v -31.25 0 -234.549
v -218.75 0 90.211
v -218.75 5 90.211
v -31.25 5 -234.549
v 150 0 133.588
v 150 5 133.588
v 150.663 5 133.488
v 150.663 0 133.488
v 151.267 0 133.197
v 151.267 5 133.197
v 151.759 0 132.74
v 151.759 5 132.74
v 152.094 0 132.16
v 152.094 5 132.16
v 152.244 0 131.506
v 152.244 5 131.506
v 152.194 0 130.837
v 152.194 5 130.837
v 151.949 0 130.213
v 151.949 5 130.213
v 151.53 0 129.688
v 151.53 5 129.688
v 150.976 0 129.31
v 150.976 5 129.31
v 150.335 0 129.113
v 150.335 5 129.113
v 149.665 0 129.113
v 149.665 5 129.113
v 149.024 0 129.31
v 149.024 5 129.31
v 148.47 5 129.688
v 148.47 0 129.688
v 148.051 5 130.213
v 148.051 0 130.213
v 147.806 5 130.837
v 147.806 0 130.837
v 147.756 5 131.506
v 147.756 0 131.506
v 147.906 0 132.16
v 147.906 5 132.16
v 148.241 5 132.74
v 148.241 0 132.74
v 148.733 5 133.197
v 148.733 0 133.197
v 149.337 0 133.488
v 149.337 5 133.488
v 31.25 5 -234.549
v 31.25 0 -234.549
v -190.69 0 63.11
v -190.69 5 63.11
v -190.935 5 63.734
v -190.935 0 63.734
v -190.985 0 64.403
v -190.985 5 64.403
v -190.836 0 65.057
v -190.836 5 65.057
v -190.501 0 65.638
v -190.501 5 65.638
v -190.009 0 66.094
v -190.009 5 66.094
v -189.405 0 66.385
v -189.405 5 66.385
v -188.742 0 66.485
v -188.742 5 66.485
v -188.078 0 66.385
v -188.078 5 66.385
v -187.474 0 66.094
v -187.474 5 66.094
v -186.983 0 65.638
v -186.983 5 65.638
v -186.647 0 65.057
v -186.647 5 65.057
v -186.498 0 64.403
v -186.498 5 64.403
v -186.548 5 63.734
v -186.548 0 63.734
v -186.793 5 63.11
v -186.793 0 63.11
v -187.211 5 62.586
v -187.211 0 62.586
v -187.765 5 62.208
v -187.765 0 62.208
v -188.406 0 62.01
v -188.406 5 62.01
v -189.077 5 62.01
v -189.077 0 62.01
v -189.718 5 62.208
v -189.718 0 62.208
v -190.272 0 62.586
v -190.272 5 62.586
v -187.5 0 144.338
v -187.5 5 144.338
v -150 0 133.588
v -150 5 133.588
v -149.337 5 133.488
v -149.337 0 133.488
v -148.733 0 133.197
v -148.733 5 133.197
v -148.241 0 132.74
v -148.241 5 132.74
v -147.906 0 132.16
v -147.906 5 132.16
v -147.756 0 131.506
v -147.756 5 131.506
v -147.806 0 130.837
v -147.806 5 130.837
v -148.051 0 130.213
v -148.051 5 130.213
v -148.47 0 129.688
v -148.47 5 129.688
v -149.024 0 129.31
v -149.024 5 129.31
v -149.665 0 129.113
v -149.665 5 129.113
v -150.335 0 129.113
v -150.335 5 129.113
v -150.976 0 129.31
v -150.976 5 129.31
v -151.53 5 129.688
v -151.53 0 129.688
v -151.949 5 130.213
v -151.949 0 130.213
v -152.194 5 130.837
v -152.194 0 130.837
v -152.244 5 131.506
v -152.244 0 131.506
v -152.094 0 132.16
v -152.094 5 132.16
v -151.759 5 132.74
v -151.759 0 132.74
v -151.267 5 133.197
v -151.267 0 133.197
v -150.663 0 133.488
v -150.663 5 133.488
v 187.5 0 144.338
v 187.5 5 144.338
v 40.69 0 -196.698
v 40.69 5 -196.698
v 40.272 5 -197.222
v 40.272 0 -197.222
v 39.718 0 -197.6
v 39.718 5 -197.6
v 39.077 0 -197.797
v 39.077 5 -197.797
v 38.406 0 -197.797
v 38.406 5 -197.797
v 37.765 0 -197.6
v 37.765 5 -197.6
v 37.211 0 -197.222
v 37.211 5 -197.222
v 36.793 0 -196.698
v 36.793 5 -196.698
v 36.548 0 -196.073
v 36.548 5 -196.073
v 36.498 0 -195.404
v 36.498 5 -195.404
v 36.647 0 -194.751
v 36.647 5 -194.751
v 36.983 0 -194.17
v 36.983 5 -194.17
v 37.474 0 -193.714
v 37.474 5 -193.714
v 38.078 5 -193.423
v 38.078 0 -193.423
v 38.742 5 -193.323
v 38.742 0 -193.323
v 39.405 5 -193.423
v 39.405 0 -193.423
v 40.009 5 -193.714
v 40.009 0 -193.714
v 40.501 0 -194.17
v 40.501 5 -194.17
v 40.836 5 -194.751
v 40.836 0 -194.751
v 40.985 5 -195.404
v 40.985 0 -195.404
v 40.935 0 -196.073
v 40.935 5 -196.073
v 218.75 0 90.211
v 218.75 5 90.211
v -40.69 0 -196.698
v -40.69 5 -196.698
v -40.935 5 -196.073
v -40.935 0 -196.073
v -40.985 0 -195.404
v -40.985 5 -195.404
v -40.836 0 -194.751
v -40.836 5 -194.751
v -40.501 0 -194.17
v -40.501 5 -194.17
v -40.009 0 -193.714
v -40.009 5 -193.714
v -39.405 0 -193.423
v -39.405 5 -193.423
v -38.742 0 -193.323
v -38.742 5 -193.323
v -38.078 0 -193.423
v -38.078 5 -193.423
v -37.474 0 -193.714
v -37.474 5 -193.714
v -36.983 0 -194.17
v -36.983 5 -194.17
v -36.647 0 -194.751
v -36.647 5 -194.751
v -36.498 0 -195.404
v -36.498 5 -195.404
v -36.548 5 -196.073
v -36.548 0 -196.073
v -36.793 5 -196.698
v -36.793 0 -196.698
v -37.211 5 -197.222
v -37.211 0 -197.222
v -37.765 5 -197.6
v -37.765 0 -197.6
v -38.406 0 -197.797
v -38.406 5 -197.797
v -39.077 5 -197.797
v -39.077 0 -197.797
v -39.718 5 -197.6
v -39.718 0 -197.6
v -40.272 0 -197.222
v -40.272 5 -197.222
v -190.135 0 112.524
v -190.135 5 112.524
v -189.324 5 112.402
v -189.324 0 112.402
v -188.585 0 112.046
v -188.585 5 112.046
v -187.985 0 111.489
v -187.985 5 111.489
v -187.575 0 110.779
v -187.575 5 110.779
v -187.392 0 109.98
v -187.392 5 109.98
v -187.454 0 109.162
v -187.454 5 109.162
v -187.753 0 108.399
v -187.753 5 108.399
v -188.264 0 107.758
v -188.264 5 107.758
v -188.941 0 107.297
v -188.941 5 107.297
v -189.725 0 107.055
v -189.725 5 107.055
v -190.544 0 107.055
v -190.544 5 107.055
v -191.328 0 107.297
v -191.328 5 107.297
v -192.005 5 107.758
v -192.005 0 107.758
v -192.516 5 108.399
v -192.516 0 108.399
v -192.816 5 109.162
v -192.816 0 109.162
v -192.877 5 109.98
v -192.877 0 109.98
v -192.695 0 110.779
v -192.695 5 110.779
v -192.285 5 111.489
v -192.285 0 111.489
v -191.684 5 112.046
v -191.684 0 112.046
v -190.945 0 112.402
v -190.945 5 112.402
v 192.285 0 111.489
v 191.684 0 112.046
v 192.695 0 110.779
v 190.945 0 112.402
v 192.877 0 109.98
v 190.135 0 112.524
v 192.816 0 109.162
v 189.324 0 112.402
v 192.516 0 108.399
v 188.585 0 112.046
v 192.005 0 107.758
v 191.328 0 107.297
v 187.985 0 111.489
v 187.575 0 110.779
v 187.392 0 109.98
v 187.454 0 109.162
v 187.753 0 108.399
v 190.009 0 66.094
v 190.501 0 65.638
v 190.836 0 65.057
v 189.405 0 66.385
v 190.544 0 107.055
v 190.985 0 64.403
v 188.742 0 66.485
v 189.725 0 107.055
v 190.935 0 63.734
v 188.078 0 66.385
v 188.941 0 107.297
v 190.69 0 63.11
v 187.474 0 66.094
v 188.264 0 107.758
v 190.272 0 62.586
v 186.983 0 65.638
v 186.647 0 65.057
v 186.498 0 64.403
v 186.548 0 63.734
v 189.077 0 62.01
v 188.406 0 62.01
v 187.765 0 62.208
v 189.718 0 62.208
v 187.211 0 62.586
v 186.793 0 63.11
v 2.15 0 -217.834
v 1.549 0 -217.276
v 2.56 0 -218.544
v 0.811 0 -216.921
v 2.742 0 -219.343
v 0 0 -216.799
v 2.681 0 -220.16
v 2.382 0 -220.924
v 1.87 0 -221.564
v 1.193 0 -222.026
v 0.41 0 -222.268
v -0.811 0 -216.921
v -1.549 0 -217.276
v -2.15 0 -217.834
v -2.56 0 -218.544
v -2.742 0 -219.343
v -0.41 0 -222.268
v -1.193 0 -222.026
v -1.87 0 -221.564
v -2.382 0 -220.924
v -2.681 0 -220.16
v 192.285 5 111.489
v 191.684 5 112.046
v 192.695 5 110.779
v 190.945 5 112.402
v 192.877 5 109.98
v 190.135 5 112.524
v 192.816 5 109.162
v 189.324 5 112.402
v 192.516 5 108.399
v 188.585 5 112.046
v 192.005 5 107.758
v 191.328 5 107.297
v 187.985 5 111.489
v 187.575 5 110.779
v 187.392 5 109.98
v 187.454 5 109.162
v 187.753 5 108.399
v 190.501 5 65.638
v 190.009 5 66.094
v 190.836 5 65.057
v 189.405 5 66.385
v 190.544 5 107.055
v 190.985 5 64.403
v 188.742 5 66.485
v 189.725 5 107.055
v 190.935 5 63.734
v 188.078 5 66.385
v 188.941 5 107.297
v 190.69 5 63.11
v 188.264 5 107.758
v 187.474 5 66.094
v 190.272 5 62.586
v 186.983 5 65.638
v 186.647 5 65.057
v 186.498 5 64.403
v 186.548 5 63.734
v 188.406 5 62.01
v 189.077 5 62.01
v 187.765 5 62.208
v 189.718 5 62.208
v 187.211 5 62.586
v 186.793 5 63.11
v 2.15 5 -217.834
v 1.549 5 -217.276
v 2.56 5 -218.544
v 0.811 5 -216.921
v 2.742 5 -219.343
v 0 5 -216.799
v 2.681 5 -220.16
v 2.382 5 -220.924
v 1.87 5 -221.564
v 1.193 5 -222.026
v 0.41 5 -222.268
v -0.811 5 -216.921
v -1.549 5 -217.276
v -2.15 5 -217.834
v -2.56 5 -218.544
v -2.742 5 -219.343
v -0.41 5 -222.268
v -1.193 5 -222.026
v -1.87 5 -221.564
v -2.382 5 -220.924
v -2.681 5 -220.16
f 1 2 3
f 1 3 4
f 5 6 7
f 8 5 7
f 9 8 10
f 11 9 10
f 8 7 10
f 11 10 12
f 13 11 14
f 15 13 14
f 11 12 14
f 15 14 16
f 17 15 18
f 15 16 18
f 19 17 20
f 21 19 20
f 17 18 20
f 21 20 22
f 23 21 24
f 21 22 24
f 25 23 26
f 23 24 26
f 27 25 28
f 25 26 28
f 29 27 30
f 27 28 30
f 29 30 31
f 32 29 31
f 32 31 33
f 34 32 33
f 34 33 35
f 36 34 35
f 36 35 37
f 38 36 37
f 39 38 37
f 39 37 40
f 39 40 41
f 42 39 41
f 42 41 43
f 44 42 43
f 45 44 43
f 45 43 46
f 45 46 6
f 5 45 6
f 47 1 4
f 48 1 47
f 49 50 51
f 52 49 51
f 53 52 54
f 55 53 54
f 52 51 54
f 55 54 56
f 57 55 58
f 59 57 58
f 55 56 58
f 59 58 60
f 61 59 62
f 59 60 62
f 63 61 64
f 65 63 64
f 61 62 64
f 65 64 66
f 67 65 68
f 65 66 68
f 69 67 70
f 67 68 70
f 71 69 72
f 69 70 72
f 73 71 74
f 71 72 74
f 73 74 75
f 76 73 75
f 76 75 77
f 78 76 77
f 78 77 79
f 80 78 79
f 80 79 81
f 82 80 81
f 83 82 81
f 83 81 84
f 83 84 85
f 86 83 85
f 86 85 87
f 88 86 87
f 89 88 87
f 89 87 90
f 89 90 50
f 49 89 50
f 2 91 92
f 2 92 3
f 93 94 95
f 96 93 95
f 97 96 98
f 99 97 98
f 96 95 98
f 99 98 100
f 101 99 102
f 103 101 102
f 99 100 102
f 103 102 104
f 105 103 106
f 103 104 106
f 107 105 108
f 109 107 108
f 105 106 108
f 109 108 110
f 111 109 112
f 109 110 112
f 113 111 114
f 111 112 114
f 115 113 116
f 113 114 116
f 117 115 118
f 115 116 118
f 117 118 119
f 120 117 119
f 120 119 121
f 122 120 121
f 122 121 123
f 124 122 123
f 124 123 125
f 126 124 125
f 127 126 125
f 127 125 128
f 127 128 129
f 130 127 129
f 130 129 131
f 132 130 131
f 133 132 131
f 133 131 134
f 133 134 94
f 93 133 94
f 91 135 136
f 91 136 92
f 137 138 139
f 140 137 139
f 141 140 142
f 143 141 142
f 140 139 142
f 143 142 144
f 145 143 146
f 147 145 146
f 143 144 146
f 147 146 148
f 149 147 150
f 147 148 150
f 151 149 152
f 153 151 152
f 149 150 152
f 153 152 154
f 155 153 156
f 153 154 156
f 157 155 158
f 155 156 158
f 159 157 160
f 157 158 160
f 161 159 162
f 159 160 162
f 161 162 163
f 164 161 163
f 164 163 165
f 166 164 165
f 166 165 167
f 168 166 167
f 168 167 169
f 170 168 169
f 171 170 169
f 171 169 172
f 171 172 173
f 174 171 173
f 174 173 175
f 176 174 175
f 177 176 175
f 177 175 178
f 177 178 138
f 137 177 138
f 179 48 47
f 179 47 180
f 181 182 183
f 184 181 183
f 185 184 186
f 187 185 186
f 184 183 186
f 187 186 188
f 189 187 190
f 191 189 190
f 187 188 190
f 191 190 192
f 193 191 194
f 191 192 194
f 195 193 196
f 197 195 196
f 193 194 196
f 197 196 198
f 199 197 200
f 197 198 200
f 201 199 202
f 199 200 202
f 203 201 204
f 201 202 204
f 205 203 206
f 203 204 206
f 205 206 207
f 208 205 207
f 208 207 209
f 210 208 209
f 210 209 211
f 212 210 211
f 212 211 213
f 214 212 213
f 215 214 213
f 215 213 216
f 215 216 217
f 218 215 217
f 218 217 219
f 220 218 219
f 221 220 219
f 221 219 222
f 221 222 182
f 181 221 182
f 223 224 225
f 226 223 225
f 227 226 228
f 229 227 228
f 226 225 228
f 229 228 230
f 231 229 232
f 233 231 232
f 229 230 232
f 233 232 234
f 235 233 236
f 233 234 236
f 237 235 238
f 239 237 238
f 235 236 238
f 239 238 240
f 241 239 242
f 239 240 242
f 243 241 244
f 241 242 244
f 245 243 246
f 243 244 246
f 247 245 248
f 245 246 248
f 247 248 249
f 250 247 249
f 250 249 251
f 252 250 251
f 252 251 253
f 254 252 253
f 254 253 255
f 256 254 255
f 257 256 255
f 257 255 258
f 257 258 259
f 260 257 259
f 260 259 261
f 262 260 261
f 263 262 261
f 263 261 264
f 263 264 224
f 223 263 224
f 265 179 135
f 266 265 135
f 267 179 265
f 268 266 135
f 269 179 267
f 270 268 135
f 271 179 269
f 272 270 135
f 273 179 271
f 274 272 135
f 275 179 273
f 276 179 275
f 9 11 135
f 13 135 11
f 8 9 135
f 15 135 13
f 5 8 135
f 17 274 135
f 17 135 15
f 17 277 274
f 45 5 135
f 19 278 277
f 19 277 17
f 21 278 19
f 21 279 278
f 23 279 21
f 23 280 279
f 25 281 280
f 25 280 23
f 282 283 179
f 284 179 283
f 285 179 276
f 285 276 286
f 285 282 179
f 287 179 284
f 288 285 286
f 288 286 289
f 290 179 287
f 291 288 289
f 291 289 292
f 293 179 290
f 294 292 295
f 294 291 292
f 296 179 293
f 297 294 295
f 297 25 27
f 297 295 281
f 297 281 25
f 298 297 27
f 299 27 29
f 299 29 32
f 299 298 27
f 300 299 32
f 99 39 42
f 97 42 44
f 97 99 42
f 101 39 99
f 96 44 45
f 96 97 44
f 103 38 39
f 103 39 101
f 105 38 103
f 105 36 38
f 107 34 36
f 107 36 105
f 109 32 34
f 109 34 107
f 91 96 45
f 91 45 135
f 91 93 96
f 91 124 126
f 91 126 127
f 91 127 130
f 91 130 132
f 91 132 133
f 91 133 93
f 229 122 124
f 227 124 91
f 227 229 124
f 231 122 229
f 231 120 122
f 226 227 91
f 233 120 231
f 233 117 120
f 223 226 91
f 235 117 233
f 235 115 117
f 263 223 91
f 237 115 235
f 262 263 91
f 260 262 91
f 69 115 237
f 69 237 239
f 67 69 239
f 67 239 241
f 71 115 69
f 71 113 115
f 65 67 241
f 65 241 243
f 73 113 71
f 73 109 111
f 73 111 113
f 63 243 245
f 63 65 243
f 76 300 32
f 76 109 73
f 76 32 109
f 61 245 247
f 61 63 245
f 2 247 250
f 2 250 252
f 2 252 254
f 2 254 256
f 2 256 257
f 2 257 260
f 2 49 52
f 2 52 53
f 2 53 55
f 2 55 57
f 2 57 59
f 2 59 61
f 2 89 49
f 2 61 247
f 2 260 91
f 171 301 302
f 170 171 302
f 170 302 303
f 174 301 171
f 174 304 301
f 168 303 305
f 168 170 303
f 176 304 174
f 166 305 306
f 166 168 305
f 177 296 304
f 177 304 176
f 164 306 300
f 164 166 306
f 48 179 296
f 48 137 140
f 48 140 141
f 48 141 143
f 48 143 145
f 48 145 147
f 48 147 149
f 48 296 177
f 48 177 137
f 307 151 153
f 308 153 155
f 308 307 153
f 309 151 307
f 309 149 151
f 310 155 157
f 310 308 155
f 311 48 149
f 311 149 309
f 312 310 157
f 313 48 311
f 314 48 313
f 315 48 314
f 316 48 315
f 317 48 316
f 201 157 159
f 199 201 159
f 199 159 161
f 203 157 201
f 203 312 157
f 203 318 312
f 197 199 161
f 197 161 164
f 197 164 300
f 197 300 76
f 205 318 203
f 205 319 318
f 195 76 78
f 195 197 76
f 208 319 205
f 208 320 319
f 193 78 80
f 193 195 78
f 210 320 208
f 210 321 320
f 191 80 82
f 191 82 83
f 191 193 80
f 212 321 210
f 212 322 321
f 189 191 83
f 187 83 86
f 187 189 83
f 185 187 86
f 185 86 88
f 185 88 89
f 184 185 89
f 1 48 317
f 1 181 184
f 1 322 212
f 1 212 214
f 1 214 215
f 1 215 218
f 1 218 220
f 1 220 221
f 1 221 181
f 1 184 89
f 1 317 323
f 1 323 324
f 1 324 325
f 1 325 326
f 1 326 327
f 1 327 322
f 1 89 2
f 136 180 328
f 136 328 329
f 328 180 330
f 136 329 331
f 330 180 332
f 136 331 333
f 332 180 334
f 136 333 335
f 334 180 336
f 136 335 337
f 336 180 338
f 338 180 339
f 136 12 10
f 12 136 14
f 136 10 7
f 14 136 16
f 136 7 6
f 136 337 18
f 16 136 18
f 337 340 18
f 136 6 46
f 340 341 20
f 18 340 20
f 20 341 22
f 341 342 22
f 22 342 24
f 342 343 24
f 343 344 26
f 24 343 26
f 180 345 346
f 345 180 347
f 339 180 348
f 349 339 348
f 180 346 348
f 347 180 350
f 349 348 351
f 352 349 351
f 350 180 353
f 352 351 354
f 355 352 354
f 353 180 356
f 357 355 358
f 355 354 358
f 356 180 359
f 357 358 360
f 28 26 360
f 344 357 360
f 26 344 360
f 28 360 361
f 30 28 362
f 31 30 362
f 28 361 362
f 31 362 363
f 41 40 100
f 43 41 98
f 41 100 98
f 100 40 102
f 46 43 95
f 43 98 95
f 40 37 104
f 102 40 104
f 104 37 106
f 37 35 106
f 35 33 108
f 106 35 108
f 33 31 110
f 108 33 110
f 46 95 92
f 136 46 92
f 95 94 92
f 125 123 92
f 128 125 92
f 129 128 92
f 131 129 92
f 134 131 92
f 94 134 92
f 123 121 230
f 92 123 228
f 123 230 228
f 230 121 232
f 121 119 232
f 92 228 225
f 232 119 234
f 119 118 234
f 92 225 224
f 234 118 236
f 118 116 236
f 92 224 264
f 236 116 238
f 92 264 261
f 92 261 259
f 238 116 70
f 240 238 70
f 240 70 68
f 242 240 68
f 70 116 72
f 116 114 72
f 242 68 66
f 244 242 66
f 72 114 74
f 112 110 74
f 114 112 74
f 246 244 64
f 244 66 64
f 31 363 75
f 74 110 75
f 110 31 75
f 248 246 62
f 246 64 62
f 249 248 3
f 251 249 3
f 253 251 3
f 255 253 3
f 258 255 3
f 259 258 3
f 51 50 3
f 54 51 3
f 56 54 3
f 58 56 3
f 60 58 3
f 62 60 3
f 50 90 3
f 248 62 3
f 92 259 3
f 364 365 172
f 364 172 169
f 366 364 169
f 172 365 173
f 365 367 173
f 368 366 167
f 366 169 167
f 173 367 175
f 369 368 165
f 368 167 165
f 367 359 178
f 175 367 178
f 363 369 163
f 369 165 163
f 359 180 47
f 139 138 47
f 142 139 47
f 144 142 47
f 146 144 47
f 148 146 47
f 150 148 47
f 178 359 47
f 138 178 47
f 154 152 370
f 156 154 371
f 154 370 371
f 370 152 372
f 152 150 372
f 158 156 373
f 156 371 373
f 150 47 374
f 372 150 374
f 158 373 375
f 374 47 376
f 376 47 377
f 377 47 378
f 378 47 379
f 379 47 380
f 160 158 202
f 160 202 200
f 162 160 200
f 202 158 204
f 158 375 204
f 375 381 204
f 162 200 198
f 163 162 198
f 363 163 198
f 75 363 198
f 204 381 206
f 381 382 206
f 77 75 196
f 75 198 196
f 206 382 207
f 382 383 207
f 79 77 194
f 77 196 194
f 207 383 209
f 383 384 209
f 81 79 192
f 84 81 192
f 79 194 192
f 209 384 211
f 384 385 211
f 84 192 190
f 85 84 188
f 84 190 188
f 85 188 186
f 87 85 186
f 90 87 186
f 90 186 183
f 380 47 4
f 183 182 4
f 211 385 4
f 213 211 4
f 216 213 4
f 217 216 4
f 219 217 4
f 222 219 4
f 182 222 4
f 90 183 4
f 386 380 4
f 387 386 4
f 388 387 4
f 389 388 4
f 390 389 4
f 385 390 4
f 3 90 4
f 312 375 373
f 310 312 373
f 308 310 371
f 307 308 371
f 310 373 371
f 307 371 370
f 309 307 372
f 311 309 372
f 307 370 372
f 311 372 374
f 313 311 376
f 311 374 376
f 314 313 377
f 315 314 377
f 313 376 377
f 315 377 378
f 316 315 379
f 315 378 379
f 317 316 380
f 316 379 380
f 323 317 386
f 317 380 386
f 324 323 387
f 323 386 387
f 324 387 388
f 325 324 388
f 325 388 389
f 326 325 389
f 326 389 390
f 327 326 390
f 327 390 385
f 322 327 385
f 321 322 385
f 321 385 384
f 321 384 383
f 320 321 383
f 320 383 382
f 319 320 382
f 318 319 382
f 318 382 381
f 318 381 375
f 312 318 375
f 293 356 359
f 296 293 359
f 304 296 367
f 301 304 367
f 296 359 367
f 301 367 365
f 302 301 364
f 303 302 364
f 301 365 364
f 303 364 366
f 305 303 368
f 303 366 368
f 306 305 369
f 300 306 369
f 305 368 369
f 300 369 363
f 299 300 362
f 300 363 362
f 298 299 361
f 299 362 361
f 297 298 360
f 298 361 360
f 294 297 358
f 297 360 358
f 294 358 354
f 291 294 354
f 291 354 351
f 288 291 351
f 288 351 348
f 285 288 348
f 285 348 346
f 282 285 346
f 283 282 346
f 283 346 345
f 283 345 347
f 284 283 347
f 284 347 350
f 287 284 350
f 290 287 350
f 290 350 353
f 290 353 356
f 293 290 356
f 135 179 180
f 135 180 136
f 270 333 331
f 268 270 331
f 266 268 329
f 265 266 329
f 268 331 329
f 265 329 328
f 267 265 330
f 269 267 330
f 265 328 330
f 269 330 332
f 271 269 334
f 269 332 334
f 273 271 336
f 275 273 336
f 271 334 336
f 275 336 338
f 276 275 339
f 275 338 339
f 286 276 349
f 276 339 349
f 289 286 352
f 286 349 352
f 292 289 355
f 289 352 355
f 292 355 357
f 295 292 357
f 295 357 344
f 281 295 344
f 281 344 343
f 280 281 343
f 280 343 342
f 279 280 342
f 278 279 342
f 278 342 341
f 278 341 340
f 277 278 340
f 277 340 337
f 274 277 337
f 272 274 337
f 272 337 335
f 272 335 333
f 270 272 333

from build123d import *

# Parameters (mm, degrees)
BOSS_EXTRU_1_DEPTH           = 5
ENL_V_MAT_EXTRU_1_REACH      = 322.764
ESQUISSE2_R                  = 2.75
ENL_V_MAT_EXTRU_4_REACH      = 322.764
ESQUISSE6_R                  = 2.25
R_P_TITION_CIRCULAIRE2_COUNT = 3


with BuildPart() as part:
    # Esquisse1 → Boss.-Extru.1 (new body)
    with BuildSketch(Plane(origin=(0, 0, 0), x_dir=(1, 0, 0), z_dir=(0, 1, 0))):
        Polygon((-31.25, 234.548546858), (31.25, 234.548546858), (218.75, -90.210979561), (187.5, -144.337567297), (-187.5, -144.337567297), (-218.75, -90.210979561), align=None)
    extrude(amount=BOSS_EXTRU_1_DEPTH)

    # Esquisse2 → Enlèv. mat.-Extru.1 (cut, up to next)
    with BuildSketch(Plane(origin=(0, 5, 0), x_dir=(1, 0, 0), z_dir=(0, 1, 0)), mode=Mode.PRIVATE) as enl_v_mat_extru_1_sk1:
        with Locations((0, 219.548546858)):
            Circle(ESQUISSE2_R)
    enl_v_mat_extru_1_tool1 = extrude(enl_v_mat_extru_1_sk1.sketch, amount=-ENL_V_MAT_EXTRU_1_REACH, mode=Mode.PRIVATE) & part.part
    # Esquisse2 → Enlèv. mat.-Extru.1 (cut, up to next)
    with BuildSketch(Plane(origin=(0, 5, 0), x_dir=(1, 0, 0), z_dir=(0, 1, 0)), mode=Mode.PRIVATE) as enl_v_mat_extru_1_sk2:
        with Locations((-190.134618943, -109.774273429)):
            Circle(ESQUISSE2_R)
    enl_v_mat_extru_1_tool2 = extrude(enl_v_mat_extru_1_sk2.sketch, amount=-ENL_V_MAT_EXTRU_1_REACH, mode=Mode.PRIVATE) & part.part
    # Esquisse2 → Enlèv. mat.-Extru.1 (cut, up to next)
    with BuildSketch(Plane(origin=(0, 5, 0), x_dir=(1, 0, 0), z_dir=(0, 1, 0)), mode=Mode.PRIVATE) as enl_v_mat_extru_1_sk3:
        with Locations((190.134618943, -109.774273429)):
            Circle(ESQUISSE2_R)
    enl_v_mat_extru_1_tool3 = extrude(enl_v_mat_extru_1_sk3.sketch, amount=-ENL_V_MAT_EXTRU_1_REACH, mode=Mode.PRIVATE) & part.part
    add(enl_v_mat_extru_1_tool1.solids().sort_by_distance((0, 5, -219.548547))[0], mode=Mode.SUBTRACT)
    add(enl_v_mat_extru_1_tool2.solids().sort_by_distance((-190.134619, 5, 109.774273))[0], mode=Mode.SUBTRACT)
    add(enl_v_mat_extru_1_tool3.solids().sort_by_distance((190.134619, 5, 109.774273))[0], mode=Mode.SUBTRACT)

    # Esquisse6 → Enlèv. mat.-Extru.4 (cut, up to next)
    with BuildSketch(Plane(origin=(0, 5, 0), x_dir=(1, 0, 0), z_dir=(0, 1, 0)), mode=Mode.PRIVATE) as enl_v_mat_extru_4_sk1:
        with Locations((-150, -131.337567297)):
            Circle(ESQUISSE6_R)
    enl_v_mat_extru_4_tool1 = extrude(enl_v_mat_extru_4_sk1.sketch, amount=-ENL_V_MAT_EXTRU_4_REACH, mode=Mode.PRIVATE) & part.part
    # Esquisse6 → Enlèv. mat.-Extru.4 (cut, up to next)
    with BuildSketch(Plane(origin=(0, 5, 0), x_dir=(1, 0, 0), z_dir=(0, 1, 0)), mode=Mode.PRIVATE) as enl_v_mat_extru_4_sk2:
        with Locations((150, -131.337567297)):
            Circle(ESQUISSE6_R)
    enl_v_mat_extru_4_tool2 = extrude(enl_v_mat_extru_4_sk2.sketch, amount=-ENL_V_MAT_EXTRU_4_REACH, mode=Mode.PRIVATE) & part.part
    enl_v_mat_extru_4_1 = enl_v_mat_extru_4_tool1.solids().sort_by_distance((-150, 5, 131.337567))[0]
    add(enl_v_mat_extru_4_1, mode=Mode.SUBTRACT)
    enl_v_mat_extru_4_2 = enl_v_mat_extru_4_tool2.solids().sort_by_distance((150, 5, 131.337567))[0]
    add(enl_v_mat_extru_4_2, mode=Mode.SUBTRACT)
    enl_v_mat_extru_4 = enl_v_mat_extru_4_1 + enl_v_mat_extru_4_2  # Enlèv. mat.-Extru.4 as one shape, for the pattern or mirror that repeats it

    # Répétition circulaire2: Enlèv. mat.-Extru.4 ×3 about axis
    r_p_tition_circulaire2_axis = Axis((0, -0.25, 0), (0, 1, 0))
    for i in range(1, R_P_TITION_CIRCULAIRE2_COUNT):
        add(enl_v_mat_extru_4.rotate(r_p_tition_circulaire2_axis, i * 360 / R_P_TITION_CIRCULAIRE2_COUNT), mode=Mode.SUBTRACT)


solid = part.part
